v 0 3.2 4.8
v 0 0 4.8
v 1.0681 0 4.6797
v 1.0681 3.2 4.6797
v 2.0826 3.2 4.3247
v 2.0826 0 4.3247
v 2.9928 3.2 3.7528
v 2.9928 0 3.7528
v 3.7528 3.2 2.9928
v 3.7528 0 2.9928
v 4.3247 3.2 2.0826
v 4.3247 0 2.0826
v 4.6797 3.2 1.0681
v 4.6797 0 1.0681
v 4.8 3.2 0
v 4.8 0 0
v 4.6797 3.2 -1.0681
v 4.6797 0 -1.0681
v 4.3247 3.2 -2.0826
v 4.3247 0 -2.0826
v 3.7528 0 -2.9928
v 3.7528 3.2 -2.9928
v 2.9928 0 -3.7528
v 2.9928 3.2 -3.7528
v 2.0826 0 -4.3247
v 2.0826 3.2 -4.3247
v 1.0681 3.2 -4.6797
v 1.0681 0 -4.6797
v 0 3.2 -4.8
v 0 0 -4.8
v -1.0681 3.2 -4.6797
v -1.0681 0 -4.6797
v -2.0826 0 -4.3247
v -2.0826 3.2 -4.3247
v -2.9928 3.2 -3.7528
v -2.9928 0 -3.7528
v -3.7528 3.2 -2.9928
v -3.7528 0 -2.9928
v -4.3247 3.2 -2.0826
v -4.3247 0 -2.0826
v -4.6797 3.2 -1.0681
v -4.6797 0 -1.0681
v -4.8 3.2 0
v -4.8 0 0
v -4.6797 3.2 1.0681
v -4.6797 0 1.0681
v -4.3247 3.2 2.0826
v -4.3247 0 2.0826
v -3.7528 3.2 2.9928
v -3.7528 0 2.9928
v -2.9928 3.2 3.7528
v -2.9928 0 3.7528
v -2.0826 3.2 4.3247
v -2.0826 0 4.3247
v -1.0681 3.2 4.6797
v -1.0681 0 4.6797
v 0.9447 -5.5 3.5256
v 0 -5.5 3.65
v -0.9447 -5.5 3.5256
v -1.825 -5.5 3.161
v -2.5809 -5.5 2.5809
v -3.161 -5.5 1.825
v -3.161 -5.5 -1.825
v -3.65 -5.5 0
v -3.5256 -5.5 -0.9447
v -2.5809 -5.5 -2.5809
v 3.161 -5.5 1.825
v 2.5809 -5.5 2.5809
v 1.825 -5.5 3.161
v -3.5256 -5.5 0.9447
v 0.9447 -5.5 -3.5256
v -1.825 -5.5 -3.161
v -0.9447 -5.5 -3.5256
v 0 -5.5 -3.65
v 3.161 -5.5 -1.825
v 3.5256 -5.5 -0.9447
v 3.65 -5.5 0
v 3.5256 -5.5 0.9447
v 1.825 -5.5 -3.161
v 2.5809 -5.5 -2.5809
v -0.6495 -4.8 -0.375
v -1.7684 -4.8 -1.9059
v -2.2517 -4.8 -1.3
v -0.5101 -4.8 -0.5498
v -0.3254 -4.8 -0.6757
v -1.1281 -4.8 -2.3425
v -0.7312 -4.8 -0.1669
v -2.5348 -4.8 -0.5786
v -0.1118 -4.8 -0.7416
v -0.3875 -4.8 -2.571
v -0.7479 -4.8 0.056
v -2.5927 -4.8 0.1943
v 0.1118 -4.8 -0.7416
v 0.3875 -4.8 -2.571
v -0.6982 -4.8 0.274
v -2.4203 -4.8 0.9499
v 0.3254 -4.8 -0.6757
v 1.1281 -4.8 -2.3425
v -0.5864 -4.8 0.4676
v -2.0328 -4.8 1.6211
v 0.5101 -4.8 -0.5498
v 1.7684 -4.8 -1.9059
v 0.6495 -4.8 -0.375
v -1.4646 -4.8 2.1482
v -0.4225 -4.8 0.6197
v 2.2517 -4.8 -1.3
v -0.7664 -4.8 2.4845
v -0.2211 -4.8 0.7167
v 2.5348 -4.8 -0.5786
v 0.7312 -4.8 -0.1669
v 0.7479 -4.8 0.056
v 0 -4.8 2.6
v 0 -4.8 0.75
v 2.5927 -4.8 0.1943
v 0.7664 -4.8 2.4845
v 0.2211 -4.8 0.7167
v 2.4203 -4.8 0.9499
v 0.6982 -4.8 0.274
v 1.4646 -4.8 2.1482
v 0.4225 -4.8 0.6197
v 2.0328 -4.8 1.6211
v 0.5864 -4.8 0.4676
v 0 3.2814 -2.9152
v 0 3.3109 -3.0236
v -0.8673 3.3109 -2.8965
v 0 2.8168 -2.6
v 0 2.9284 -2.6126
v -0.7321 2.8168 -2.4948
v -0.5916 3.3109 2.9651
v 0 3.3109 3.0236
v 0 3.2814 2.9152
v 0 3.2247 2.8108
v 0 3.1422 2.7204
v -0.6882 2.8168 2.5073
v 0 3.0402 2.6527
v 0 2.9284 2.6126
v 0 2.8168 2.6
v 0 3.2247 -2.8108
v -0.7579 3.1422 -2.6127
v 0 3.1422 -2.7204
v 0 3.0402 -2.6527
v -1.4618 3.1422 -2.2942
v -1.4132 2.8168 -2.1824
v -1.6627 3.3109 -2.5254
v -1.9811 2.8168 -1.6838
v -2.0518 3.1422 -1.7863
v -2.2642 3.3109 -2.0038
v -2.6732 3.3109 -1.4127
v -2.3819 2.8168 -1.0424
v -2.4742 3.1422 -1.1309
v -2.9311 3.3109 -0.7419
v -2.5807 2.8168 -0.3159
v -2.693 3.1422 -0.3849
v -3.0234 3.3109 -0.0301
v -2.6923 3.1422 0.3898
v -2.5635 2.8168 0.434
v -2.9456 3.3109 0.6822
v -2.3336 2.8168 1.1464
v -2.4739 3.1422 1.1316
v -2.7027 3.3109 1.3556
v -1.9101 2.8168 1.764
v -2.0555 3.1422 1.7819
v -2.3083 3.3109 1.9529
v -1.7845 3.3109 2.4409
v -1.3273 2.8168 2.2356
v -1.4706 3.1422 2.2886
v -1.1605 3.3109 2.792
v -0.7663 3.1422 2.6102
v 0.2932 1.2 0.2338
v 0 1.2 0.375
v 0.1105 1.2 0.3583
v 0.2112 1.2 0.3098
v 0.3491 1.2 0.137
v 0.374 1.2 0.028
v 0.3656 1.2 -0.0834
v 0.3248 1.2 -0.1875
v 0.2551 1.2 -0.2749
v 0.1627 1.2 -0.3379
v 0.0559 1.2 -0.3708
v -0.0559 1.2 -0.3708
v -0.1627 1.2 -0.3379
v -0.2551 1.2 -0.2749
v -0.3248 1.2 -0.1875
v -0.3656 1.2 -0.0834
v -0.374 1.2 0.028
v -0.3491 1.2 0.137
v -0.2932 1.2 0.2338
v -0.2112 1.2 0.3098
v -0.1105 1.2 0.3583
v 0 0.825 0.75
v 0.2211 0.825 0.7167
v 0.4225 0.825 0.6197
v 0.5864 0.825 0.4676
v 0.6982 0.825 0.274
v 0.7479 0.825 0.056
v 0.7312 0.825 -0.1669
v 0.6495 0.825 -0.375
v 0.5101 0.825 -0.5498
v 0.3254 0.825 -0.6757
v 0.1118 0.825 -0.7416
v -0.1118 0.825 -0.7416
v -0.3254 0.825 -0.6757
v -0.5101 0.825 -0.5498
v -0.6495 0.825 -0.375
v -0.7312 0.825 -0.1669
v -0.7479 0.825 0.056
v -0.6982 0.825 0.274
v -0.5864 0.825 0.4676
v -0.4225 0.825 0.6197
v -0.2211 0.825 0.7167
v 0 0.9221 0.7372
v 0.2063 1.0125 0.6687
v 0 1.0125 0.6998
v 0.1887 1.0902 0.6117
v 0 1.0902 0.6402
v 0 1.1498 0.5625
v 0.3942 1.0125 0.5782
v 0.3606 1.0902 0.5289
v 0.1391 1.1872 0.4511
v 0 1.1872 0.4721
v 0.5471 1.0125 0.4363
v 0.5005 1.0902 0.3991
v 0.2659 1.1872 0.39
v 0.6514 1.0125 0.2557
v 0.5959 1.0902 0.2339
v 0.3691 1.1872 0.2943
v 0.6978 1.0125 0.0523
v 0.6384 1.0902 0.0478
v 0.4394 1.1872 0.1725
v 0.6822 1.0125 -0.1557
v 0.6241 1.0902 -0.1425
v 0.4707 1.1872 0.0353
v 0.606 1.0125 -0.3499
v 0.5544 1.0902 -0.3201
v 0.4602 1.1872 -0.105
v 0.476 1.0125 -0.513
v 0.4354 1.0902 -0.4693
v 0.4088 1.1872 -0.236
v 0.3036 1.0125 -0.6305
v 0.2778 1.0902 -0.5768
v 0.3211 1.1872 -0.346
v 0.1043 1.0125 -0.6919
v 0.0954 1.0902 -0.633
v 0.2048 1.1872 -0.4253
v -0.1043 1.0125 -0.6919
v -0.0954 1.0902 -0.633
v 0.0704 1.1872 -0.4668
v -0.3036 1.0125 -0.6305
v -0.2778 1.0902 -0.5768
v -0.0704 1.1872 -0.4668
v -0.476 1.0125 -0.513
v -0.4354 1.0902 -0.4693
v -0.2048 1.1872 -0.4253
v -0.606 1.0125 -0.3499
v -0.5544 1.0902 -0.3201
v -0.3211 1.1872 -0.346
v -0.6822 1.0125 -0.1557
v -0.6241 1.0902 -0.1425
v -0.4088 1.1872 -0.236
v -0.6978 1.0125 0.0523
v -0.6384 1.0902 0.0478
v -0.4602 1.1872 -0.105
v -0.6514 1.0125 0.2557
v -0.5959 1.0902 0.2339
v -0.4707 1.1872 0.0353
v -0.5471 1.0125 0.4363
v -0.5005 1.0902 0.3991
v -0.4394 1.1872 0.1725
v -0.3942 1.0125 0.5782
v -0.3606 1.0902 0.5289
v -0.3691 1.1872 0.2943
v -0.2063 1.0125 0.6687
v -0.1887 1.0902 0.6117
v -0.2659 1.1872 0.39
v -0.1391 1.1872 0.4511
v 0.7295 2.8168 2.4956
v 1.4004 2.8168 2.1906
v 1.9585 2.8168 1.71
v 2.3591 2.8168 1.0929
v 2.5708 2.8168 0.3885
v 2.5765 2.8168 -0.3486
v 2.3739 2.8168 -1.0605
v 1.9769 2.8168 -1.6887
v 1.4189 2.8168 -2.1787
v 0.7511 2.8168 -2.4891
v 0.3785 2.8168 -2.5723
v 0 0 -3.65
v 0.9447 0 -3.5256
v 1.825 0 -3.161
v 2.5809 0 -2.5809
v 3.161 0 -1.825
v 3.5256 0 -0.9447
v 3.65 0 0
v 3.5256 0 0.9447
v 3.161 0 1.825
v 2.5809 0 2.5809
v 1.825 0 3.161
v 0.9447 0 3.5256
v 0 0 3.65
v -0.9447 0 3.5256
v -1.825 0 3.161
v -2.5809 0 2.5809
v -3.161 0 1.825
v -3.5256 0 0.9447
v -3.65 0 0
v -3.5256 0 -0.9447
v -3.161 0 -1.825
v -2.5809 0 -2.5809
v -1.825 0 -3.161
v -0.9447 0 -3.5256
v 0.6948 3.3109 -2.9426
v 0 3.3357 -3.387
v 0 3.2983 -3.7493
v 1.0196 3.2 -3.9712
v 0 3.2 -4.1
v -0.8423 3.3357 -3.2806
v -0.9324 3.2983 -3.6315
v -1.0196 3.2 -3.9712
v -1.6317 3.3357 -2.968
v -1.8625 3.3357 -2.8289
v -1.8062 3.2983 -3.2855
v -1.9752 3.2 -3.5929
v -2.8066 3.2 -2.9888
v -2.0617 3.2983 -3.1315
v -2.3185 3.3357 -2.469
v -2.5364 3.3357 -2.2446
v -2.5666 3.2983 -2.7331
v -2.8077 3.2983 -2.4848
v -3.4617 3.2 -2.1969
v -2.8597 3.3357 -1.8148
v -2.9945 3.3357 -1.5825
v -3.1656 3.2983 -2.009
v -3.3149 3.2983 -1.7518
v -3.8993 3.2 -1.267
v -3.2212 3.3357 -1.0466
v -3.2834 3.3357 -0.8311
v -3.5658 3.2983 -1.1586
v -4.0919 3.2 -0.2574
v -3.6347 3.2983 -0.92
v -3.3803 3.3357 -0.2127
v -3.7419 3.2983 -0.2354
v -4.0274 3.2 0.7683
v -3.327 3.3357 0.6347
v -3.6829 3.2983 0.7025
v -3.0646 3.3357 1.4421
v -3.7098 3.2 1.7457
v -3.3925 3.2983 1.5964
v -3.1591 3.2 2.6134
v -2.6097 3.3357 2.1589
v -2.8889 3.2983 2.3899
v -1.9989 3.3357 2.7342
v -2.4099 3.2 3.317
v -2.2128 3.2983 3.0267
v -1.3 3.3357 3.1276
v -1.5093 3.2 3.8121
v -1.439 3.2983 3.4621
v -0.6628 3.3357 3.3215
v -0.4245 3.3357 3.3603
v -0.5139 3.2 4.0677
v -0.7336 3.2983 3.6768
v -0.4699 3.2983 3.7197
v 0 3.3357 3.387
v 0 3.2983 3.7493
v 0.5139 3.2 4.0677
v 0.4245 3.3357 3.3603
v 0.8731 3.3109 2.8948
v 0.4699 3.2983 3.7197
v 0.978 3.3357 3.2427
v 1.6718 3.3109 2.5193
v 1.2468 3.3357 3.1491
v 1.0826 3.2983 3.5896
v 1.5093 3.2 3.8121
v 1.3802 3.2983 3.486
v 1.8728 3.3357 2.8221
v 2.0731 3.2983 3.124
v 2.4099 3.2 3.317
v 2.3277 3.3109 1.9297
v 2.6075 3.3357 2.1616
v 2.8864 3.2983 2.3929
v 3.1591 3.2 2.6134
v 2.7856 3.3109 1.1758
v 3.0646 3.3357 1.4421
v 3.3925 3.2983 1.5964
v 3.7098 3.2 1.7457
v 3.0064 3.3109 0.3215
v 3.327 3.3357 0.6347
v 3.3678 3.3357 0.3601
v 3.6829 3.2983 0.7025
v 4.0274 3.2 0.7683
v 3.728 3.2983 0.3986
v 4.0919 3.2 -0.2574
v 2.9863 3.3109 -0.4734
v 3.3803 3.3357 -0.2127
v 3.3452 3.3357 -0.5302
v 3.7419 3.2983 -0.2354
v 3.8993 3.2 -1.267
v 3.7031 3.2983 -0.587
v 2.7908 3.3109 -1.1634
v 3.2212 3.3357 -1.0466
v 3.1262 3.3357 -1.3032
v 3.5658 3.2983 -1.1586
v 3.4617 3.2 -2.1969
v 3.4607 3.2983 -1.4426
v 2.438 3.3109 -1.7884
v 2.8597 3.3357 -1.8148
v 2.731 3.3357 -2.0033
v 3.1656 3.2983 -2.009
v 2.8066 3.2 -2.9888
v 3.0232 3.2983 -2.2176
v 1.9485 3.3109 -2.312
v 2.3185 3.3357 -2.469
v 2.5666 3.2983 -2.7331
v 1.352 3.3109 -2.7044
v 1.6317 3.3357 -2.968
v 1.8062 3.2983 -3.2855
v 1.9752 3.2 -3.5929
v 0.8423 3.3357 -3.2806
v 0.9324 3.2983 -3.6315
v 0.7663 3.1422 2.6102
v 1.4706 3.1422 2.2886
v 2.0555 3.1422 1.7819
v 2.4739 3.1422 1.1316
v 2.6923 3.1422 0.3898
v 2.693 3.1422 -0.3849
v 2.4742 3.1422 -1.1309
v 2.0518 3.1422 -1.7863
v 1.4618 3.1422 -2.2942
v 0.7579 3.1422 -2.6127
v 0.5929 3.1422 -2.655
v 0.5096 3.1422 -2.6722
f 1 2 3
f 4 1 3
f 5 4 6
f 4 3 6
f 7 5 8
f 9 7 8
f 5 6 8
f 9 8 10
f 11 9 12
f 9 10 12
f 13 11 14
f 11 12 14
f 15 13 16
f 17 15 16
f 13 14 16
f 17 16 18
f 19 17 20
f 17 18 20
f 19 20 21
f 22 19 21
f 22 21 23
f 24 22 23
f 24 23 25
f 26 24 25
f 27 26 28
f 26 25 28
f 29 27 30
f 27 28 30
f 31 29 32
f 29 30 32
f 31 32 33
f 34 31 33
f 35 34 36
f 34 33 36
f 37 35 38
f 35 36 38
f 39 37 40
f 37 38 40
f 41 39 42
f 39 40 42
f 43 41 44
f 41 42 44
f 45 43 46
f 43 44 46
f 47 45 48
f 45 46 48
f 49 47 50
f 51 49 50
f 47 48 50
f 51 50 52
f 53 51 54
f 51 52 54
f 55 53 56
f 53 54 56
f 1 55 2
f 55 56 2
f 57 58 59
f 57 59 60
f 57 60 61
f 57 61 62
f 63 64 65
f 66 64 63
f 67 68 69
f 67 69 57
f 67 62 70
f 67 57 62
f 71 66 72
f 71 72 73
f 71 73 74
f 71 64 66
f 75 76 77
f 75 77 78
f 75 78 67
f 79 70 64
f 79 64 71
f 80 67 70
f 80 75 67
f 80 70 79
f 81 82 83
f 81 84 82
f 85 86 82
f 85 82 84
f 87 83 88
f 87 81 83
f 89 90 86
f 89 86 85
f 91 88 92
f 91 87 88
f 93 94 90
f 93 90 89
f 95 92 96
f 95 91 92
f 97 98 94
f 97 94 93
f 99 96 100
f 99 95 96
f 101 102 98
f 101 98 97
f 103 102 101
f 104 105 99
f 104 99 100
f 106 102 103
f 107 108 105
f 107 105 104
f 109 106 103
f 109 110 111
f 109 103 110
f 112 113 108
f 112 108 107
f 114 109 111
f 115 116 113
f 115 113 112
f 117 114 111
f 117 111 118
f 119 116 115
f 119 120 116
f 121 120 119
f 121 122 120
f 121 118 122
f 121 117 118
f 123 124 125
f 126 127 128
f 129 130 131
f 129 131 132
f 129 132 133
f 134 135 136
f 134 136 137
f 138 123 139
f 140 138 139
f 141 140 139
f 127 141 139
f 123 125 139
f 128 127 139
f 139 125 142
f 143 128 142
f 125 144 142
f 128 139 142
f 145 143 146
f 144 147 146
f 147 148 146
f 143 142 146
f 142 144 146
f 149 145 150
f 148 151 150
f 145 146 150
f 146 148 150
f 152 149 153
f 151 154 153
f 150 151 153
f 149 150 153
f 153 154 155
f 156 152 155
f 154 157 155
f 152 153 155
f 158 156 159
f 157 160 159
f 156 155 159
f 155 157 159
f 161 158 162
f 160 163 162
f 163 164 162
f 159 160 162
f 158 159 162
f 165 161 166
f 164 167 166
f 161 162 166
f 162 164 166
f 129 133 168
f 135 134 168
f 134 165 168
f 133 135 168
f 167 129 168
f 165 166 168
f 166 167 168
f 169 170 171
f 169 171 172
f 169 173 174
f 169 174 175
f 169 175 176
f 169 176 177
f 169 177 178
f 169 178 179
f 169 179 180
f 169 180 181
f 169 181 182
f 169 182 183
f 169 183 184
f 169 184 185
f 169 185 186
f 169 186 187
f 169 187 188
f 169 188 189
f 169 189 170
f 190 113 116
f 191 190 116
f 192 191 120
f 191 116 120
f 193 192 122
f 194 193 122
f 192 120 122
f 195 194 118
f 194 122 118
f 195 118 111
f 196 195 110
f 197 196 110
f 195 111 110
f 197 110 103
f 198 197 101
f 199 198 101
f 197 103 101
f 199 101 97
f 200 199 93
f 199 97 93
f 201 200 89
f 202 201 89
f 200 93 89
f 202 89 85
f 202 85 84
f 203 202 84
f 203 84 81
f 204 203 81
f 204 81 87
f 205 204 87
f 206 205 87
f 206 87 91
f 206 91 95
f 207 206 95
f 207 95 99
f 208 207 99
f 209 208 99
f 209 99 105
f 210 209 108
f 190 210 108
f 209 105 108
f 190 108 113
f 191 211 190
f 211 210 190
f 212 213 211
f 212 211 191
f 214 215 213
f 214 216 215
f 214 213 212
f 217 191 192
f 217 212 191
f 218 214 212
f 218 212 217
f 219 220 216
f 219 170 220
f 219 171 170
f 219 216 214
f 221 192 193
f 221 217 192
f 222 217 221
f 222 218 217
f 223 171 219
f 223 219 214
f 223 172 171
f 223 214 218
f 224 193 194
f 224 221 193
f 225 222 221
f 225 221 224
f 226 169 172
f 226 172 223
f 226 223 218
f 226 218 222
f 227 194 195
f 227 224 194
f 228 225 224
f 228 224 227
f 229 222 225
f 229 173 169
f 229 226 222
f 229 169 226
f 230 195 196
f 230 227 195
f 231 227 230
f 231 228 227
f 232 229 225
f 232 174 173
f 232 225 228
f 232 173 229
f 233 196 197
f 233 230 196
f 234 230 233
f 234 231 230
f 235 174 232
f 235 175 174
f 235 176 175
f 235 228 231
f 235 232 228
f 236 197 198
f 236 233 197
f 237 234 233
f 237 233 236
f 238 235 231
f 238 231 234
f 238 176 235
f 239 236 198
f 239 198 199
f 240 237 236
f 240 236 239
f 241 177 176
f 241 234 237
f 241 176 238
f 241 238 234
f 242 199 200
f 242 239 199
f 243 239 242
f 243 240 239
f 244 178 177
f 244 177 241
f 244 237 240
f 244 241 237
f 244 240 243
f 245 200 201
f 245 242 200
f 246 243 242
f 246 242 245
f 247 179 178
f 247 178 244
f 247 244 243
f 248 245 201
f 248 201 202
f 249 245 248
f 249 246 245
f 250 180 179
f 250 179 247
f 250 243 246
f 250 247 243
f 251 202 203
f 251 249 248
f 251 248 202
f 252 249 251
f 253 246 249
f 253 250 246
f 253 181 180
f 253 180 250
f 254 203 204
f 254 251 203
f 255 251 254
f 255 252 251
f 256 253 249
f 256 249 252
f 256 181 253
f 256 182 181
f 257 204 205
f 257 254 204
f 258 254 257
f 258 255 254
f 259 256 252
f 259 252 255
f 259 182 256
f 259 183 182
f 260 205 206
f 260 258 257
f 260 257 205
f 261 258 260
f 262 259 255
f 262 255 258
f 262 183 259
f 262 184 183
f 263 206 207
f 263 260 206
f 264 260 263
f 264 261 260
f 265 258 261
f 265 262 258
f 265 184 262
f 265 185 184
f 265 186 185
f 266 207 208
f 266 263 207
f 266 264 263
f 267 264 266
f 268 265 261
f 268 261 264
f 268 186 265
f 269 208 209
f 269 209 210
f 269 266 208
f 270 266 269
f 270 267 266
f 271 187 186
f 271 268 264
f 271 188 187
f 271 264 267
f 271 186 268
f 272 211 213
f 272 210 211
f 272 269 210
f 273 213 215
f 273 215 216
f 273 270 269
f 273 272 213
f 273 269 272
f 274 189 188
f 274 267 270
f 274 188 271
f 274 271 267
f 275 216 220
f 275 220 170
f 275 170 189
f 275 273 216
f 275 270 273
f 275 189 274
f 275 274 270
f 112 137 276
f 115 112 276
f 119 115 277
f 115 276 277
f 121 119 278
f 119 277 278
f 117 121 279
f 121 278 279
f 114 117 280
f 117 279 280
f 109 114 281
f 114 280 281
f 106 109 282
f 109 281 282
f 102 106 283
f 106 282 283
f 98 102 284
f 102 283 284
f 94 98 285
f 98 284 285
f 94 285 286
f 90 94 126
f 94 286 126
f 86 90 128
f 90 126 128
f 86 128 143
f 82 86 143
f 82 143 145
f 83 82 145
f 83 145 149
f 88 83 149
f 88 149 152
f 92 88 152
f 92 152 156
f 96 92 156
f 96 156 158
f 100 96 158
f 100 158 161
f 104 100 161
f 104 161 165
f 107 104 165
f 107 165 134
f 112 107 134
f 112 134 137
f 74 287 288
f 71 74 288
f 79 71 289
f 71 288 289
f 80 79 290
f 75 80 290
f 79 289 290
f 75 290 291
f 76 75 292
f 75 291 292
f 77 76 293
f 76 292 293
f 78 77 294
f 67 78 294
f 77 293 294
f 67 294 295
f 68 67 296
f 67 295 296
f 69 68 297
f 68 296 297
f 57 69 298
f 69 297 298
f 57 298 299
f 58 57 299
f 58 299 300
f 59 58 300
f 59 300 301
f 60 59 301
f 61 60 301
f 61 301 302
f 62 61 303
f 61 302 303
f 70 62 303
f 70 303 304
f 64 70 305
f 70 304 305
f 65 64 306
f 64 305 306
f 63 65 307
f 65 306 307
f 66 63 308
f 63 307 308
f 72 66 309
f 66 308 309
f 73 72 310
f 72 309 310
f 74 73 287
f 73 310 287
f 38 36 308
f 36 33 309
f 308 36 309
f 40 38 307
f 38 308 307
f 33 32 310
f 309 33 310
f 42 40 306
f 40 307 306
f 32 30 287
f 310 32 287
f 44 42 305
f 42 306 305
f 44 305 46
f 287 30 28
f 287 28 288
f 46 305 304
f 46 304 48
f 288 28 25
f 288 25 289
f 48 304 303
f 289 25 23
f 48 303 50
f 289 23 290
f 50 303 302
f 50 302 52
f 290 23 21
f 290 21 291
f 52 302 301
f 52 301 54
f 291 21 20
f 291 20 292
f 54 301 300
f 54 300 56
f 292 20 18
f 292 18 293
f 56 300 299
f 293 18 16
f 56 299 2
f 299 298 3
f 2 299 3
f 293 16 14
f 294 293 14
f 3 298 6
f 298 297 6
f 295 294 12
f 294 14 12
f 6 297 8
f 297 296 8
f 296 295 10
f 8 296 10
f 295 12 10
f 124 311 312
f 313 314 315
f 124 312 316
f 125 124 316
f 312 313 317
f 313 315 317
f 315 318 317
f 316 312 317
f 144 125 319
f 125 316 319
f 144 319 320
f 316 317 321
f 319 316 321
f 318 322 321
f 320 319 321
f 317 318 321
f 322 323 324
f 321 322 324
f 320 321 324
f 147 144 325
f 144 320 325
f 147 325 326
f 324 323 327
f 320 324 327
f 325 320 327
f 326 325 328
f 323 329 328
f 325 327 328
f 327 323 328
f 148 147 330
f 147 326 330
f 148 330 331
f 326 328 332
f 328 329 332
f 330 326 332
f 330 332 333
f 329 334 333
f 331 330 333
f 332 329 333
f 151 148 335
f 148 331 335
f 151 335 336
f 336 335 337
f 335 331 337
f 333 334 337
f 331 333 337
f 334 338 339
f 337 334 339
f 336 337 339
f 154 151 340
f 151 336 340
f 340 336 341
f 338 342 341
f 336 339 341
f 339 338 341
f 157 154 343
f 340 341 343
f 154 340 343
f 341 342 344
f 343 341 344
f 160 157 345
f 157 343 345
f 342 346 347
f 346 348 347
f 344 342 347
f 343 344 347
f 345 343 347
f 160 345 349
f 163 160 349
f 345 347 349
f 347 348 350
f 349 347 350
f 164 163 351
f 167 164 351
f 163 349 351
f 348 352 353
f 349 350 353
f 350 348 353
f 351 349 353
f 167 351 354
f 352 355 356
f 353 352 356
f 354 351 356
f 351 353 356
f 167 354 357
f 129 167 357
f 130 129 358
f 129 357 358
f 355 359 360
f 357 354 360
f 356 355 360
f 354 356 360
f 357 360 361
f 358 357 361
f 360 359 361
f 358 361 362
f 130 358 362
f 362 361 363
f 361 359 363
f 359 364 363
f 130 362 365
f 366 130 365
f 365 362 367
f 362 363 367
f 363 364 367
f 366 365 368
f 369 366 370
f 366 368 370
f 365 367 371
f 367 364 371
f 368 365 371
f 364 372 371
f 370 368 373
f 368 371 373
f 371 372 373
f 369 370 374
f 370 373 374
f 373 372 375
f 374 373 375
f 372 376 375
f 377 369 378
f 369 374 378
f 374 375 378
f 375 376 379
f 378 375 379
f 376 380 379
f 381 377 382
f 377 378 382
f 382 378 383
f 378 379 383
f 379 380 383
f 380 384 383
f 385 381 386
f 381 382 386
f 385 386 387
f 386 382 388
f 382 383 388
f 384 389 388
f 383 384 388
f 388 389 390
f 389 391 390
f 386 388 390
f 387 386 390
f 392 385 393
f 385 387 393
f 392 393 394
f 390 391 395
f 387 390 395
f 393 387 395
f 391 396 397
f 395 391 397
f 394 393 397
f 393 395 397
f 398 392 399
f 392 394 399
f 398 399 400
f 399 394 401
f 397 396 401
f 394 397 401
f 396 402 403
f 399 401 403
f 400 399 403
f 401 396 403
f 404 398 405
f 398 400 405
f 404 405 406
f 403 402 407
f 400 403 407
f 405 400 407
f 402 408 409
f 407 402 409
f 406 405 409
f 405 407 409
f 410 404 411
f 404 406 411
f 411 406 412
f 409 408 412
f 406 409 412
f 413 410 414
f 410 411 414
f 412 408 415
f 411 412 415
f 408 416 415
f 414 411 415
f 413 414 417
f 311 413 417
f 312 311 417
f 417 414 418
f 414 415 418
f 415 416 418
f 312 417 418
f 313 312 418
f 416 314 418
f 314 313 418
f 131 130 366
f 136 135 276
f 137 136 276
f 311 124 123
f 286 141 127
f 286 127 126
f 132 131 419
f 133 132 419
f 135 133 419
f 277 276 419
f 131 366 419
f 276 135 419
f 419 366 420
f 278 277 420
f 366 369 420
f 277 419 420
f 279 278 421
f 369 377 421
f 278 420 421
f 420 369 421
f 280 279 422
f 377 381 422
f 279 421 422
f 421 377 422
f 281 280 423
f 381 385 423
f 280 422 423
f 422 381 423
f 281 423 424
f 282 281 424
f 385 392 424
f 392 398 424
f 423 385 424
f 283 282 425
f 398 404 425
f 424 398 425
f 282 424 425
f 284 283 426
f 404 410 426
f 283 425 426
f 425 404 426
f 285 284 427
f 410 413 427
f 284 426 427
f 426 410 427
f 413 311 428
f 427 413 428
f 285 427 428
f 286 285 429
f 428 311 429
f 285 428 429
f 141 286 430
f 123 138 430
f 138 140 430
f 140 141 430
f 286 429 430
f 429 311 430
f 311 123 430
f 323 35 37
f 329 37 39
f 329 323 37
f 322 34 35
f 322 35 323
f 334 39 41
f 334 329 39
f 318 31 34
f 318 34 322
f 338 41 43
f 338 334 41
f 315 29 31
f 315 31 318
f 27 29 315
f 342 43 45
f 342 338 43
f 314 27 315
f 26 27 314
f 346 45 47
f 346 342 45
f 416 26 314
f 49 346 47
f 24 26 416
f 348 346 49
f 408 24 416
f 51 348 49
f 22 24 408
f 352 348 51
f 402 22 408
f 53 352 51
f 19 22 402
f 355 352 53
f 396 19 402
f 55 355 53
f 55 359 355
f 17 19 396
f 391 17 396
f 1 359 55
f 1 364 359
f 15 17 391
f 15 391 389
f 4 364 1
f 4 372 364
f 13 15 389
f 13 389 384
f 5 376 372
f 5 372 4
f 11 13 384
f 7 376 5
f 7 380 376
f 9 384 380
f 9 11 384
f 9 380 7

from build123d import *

# Parameters (mm, degrees)
SKETCH1_R           = 4.8
BOSS_EXTRUDE1_DEPTH = 3.2
SKETCH2_R           = 3.65
BOSS_EXTRUDE2_DEPTH = 5.5
SKETCH3_R           = 2.6
CUT_EXTRUDE1_DEPTH  = 8
FILLET1_R           = 0.5
SKETCH5_R           = 0.75
BOSS_EXTRUDE3_DEPTH = 6
FILLET2_R           = 0.375


with BuildPart() as part:
    # Sketch1 → Boss-Extrude1 (new body)
    with BuildSketch(Plane(origin=(0, 0, 0), x_dir=(1, 0, 0), z_dir=(0, 1, 0))):
        with Locations(Location((0, 0, 0), (0, 0, 270))):
            Circle(SKETCH1_R)
    extrude(amount=BOSS_EXTRUDE1_DEPTH)

    # Sketch2 → Boss-Extrude2 (add)
    with BuildSketch(Plane.XZ):
        with Locations(Location((0, 0, 0), (0, 0, 270))):
            Circle(SKETCH2_R)
    extrude(amount=BOSS_EXTRUDE2_DEPTH)

    # Sketch3 → Cut-Extrude1 (cut)
    with BuildSketch(Plane(origin=(0, 3.2, 0), x_dir=(1, 0, 0), z_dir=(0, 1, 0))):
        with Locations(Location((0, 0, 0), (0, 0, 270))):
            Circle(SKETCH3_R)
    extrude(amount=-CUT_EXTRUDE1_DEPTH, mode=Mode.SUBTRACT)

    # Sketch4 → Revolve1 (revolve)
    with BuildSketch(Plane.XY, mode=Mode.PRIVATE) as revolve1_sk:
        with BuildLine():
            Line((-4.1, 3.2), (-2.6, 3.2))
            ThreePointArc((-2.6, 3.2), (-3.35, 3.336000936), (-4.1, 3.2))
        make_face()
    revolve(revolve1_sk.sketch.rotate(Axis((0, 0, 0), (0, 1, 0)), 270), axis=Axis((0, 0, 0), (0, 1, 0)))

    # Fillet1
    fillet1_edges = [part.edges().sort_by_distance(p)[0] for p in [
        (2.6, 3.2, 0),
    ]]
    fillet(fillet1_edges, radius=FILLET1_R)

    # Sketch5 → Boss-Extrude3 (add)
    with BuildSketch(Plane(origin=(0, -4.8, 0), x_dir=(1, 0, 0), z_dir=(0, 1, 0))):
        with Locations(Location((0, 0, 0), (0, 0, 270))):
            Circle(SKETCH5_R)
    extrude(amount=BOSS_EXTRUDE3_DEPTH)

    # Fillet2
    fillet2_edges = [part.edges().sort_by_distance(p)[0] for p in [
        (0, 1.2, -0.75),
    ]]
    fillet(fillet2_edges, radius=FILLET2_R)


solid = part.part
